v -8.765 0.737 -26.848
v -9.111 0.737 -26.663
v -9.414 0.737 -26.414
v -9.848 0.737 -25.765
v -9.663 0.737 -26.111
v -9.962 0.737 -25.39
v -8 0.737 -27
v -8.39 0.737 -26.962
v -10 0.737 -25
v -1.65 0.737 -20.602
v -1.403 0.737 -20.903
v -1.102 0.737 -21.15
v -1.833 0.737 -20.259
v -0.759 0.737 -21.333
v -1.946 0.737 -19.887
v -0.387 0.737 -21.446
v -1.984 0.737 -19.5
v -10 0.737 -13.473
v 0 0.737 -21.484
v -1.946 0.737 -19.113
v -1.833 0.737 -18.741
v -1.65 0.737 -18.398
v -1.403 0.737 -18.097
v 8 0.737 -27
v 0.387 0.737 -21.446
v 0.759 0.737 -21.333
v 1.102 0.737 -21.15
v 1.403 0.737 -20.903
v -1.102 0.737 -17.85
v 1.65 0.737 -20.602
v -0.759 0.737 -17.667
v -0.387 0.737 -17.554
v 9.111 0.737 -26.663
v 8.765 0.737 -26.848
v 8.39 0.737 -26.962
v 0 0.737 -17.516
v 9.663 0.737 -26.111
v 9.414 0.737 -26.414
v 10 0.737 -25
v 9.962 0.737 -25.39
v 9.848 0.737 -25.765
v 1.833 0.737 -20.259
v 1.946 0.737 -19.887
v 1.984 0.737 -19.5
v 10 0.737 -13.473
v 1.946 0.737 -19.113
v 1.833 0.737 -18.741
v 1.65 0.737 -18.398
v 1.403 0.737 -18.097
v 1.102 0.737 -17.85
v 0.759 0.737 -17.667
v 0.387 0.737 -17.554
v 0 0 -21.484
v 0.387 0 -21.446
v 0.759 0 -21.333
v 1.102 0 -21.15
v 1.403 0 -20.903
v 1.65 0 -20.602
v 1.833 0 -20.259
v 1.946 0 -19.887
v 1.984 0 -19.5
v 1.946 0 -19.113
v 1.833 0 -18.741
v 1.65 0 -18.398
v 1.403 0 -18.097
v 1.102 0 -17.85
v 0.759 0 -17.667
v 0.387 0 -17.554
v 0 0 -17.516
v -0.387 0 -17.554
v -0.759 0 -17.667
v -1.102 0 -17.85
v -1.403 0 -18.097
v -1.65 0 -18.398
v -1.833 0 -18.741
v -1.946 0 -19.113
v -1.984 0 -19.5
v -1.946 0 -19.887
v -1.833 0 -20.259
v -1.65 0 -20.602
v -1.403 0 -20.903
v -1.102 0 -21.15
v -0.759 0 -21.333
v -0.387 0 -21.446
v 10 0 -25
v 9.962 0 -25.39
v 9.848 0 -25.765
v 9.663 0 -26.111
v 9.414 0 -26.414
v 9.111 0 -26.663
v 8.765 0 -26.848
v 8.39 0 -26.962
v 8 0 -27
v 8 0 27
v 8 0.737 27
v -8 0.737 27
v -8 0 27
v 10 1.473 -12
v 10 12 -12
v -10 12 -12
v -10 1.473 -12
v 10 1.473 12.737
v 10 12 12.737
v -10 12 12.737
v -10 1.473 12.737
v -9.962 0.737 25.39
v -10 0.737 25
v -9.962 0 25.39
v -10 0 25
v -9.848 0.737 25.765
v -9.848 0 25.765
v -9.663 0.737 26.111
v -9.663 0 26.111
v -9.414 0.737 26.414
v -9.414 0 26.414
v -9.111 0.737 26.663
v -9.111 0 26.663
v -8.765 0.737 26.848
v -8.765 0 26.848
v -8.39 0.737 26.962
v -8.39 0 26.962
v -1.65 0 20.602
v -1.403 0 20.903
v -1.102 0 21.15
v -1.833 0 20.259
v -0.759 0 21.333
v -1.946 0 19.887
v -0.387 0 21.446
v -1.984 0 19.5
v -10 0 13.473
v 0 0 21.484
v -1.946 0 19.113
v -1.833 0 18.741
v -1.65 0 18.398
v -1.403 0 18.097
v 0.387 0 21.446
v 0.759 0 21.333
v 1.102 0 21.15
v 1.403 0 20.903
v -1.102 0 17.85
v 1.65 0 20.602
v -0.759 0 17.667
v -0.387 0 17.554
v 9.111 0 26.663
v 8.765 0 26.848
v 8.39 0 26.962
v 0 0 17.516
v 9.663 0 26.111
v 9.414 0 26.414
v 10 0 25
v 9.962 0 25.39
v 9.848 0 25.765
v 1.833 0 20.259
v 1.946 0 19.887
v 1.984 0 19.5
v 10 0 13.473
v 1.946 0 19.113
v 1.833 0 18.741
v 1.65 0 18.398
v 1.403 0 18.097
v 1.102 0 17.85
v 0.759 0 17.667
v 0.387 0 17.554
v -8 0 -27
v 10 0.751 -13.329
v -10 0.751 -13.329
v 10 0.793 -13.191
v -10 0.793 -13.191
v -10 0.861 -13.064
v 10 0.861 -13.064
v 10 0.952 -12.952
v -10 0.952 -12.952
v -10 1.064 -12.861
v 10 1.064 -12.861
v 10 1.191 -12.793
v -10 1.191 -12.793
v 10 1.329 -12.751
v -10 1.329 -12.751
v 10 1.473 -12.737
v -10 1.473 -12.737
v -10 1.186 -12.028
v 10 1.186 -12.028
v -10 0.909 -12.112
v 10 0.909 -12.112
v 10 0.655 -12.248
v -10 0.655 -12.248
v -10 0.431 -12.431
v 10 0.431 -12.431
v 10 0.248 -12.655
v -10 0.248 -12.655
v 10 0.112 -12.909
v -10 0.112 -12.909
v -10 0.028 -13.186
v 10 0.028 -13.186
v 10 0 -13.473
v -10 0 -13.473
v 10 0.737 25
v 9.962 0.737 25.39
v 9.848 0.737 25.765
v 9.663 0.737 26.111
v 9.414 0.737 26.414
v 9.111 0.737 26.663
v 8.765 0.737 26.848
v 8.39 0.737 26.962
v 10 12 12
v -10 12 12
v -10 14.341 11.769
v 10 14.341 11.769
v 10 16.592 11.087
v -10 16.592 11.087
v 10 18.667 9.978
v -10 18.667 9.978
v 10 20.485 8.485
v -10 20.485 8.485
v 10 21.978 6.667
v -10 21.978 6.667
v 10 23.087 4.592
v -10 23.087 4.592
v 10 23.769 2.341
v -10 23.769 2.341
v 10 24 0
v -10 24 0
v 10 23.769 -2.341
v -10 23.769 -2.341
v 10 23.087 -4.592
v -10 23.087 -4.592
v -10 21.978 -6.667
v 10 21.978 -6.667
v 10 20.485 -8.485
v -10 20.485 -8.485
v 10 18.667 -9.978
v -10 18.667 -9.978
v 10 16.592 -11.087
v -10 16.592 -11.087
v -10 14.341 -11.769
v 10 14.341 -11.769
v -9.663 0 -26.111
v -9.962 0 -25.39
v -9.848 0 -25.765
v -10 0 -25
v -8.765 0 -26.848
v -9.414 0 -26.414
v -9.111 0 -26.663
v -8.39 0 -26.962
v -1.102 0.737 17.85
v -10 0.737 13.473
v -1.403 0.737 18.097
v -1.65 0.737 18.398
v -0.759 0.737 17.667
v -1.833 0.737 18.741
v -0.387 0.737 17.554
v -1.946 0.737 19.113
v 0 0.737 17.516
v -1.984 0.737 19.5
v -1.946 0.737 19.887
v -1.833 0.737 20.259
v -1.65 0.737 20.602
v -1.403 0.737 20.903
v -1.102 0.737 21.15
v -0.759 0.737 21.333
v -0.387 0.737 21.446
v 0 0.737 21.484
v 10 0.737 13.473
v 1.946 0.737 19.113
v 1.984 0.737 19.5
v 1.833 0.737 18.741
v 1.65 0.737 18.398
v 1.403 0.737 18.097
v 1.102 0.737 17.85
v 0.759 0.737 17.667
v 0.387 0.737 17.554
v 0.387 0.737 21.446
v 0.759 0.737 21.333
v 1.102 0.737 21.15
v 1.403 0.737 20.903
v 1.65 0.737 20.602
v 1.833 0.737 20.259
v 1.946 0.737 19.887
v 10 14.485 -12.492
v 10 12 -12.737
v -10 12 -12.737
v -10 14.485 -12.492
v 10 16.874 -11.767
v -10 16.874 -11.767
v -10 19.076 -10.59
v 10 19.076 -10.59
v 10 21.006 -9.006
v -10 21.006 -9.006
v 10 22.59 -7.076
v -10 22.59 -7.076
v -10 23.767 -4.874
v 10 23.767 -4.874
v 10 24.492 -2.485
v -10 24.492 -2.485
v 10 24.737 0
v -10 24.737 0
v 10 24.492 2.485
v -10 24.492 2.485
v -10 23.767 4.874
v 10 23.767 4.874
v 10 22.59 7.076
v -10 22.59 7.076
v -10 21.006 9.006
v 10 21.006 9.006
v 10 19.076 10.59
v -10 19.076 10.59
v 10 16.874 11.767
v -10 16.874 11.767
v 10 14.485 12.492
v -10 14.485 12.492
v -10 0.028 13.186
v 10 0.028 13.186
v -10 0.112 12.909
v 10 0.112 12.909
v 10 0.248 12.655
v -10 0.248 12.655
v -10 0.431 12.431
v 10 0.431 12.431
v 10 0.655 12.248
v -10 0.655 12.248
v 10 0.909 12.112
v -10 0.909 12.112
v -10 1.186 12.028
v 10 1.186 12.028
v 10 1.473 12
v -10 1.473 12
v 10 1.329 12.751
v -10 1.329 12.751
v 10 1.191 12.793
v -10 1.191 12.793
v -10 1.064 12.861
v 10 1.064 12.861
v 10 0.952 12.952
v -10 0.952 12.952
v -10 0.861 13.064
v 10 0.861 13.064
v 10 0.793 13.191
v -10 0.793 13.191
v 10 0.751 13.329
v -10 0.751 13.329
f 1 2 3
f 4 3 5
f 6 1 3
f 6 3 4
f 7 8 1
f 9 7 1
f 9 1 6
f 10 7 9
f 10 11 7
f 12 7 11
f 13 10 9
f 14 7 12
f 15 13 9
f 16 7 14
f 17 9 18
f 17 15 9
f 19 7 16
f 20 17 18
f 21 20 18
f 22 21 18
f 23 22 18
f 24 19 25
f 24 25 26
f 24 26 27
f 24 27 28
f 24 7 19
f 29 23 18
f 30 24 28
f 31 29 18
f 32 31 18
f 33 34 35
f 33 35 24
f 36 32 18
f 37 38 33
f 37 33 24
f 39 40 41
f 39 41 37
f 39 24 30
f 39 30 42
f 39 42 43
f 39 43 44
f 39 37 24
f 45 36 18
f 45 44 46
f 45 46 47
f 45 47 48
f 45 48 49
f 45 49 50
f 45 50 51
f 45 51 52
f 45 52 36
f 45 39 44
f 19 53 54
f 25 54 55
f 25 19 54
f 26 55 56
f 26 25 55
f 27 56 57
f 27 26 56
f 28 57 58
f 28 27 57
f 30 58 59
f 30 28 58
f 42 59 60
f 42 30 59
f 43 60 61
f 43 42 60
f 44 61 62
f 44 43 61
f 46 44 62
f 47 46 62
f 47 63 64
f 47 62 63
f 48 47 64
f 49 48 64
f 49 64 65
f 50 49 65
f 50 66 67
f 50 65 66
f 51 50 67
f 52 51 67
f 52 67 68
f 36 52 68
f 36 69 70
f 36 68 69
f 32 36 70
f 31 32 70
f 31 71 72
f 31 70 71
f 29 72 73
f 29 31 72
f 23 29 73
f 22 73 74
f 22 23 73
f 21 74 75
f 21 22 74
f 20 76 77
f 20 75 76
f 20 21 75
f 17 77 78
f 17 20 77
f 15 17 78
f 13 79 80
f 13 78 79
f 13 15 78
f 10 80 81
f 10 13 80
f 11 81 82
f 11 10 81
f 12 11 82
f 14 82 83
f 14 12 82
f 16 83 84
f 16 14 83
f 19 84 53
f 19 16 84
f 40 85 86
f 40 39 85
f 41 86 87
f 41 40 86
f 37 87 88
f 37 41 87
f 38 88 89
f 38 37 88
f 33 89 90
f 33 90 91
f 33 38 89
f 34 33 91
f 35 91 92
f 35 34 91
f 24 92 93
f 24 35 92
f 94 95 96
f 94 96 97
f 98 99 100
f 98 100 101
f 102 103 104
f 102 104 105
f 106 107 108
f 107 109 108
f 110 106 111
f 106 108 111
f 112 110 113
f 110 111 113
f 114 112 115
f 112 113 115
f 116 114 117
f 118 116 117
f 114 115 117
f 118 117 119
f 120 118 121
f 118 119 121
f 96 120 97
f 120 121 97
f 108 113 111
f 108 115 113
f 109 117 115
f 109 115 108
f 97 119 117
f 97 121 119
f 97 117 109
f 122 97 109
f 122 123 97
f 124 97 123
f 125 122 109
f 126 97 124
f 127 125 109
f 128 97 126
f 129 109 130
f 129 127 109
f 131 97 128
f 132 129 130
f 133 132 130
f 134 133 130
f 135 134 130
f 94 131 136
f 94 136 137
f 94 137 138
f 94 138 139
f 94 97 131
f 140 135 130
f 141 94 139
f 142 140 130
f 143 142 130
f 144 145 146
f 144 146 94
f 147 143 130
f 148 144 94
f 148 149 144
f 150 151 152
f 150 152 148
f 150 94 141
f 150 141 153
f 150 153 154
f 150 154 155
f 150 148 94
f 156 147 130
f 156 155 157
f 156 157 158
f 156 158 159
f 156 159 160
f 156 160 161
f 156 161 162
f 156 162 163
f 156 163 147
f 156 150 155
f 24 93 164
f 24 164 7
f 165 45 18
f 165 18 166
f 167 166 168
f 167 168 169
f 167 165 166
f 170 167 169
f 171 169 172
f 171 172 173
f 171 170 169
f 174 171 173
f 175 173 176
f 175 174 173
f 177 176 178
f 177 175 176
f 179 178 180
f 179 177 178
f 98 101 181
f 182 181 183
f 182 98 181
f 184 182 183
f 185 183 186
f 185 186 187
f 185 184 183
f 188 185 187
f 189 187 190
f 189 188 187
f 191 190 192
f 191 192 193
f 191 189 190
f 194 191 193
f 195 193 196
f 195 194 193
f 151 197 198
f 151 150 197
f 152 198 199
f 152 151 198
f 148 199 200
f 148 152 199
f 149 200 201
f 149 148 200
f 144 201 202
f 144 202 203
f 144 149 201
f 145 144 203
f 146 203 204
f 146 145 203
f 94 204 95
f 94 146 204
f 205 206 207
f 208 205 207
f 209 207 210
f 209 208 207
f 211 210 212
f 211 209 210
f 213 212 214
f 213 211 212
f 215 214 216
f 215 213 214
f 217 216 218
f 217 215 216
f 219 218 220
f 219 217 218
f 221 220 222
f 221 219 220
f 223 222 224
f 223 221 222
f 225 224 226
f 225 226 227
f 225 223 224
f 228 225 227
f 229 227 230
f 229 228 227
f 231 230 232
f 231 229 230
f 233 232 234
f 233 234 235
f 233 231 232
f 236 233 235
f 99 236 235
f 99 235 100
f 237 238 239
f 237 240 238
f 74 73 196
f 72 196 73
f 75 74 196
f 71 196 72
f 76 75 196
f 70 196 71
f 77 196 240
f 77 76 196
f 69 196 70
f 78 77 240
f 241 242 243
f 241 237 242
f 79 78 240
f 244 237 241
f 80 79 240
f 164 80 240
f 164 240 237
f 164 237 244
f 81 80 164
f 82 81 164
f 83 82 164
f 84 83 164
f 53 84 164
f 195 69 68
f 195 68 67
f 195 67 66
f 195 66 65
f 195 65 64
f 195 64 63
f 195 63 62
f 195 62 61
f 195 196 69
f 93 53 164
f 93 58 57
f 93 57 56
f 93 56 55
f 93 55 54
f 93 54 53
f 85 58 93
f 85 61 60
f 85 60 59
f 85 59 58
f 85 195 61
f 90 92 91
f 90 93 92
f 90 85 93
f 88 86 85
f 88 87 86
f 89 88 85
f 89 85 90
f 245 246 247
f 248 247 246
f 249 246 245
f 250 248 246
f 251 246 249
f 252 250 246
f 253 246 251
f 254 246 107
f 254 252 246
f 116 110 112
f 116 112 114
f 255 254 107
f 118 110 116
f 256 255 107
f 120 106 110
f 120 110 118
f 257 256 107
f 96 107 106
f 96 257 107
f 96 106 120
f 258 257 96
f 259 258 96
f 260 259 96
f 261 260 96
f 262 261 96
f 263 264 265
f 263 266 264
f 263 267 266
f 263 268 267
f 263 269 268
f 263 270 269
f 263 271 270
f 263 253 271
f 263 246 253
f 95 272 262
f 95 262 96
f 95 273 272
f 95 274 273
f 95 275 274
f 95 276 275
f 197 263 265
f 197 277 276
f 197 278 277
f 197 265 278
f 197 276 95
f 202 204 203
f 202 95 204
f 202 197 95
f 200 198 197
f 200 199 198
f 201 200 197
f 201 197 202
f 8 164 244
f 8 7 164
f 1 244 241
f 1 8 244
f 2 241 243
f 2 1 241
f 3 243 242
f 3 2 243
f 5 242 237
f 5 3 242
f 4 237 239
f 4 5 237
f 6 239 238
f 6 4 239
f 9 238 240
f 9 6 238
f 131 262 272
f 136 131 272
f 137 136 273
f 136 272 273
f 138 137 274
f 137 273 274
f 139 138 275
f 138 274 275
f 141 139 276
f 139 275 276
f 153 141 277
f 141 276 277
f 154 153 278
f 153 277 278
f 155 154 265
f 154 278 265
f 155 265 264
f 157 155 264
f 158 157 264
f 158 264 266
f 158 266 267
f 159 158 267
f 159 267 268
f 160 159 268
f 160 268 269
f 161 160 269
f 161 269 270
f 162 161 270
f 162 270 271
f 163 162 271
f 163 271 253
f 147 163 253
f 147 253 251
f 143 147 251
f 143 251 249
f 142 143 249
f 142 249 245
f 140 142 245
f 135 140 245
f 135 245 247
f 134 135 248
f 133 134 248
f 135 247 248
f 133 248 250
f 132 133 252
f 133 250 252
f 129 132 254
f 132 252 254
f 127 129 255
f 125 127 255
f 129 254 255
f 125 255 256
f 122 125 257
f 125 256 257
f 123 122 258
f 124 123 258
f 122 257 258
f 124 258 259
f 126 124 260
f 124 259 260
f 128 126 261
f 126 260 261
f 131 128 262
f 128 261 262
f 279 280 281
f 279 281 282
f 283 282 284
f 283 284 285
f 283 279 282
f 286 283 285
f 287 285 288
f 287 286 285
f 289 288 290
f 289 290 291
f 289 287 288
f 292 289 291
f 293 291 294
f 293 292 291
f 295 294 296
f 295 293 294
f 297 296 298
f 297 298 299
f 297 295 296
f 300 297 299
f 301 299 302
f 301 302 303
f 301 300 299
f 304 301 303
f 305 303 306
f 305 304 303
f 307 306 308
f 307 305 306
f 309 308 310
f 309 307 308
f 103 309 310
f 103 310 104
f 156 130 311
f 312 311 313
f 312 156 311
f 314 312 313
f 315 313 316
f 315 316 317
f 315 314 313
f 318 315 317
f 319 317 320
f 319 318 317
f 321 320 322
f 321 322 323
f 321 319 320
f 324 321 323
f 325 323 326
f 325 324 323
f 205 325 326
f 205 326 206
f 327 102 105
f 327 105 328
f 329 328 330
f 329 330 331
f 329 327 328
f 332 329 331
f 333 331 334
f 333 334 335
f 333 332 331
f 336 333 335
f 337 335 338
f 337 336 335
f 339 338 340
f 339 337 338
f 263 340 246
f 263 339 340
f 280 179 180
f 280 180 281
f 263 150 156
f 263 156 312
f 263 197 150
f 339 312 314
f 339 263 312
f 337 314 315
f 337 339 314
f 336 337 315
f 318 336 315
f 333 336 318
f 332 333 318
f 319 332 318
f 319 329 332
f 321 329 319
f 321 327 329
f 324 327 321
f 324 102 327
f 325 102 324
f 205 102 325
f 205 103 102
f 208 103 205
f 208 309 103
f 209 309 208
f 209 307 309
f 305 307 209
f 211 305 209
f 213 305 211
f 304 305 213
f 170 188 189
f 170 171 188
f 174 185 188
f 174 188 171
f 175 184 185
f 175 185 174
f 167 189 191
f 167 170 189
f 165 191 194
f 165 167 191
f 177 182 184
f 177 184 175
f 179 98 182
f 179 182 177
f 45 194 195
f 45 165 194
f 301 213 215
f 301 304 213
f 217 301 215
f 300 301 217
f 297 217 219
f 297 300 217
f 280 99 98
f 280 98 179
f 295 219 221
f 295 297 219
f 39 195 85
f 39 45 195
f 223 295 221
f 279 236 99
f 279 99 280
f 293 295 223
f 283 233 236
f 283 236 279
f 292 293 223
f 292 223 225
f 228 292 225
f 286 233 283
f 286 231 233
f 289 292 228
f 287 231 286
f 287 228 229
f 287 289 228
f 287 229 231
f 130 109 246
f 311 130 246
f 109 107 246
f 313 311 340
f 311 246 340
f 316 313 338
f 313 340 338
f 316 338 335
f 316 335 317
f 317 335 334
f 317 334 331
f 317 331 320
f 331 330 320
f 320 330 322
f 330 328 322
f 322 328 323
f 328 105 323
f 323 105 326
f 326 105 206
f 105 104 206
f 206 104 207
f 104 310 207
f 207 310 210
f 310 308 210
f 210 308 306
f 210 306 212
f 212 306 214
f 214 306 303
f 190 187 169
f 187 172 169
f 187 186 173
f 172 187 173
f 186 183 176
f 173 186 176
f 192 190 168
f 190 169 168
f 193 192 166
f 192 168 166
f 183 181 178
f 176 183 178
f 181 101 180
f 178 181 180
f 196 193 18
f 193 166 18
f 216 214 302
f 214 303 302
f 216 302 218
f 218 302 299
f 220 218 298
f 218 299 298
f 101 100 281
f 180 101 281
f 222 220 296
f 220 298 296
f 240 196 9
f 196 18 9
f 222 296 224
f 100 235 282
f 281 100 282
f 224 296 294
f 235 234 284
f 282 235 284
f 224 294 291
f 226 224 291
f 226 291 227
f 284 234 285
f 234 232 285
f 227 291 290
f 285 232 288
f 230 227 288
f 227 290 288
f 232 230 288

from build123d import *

# Parameters (mm, degrees)
BASE_FLANGE1_DEPTH = 10
SKETCH6_R          = 1.984375
CUT_EXTRUDE1_DEPTH = 38.483329628
FILLET1_R          = 2
FILLET2_R          = 2
FILLET3_R          = 2


# Sheet-metal steps are written as plain solids
with BuildPart() as part:
    # Sketch1 → Base-Flange1 (new, symmetric)
    with BuildSketch(Plane(origin=(0, 0, 0), x_dir=(0, 0, -1), z_dir=(1, 0, 0))):
        with BuildLine():
            Line((-27, 0), (-13.4732, 0))
            ThreePointArc((-13.4732, 0), (-12.43149029, 0.43149029), (-12, 1.4732))
            Line((-12, 1.4732), (-12, 12))
            ThreePointArc((-12, 12), (0, 24), (12, 12))
            Line((12, 12), (12, 1.4732))
            ThreePointArc((12, 1.4732), (12.43149029, 0.43149029), (13.4732, 0))
            Line((13.4732, 0), (27, 0))
            Line((27, 0), (27, 0.7366))
            Line((27, 0.7366), (13.4732, 0.7366))
            ThreePointArc((13.4732, 0.7366), (12.952345145, 0.952345145), (12.7366, 1.4732))
            Line((12.7366, 1.4732), (12.7366, 12))
            ThreePointArc((12.7366, 12), (0, 24.7366), (-12.7366, 12))
            Line((-12.7366, 12), (-12.7366, 1.4732))
            ThreePointArc((-12.7366, 1.4732), (-12.952345145, 0.952345145), (-13.4732, 0.7366))
            Line((-13.4732, 0.7366), (-27, 0.7366))
            Line((-27, 0.7366), (-27, 0))
        make_face()
    extrude(amount=BASE_FLANGE1_DEPTH, both=True)

    # Sketch6 → Cut-Extrude1 (cut, through all)
    with BuildSketch(Plane(origin=(0, 0.7366, 0), x_dir=(1, 0, 0), z_dir=(0, 1, 0))):
        with Locations(Location((0, -19.5, 0), (0, 0, 270))):
            Circle(SKETCH6_R)
    cut_extrude1 = extrude(amount=-CUT_EXTRUDE1_DEPTH, mode=Mode.SUBTRACT)

    # Mirror1: Cut-Extrude1 across plane
    add(cut_extrude1.mirror(Plane.XY), mode=Mode.SUBTRACT)

    # Fillet1
    fillet1_edges = [part.edges().sort_by_distance(p)[0] for p in [
        (10, 0.3683, -27),
    ]]
    fillet(fillet1_edges, radius=FILLET1_R)

    # Fillet2
    fillet2_edges = [part.edges().sort_by_distance(p)[0] for p in [
        (-10, 0.3683, -27),
    ]]
    fillet(fillet2_edges, radius=FILLET2_R)

    # Fillet3
    fillet3_edges = [part.edges().sort_by_distance(p)[0] for p in [
        (-10, 0.3683, 27),
        (10, 0.3683, 27),
    ]]
    fillet(fillet3_edges, radius=FILLET3_R)


solid = part.part
